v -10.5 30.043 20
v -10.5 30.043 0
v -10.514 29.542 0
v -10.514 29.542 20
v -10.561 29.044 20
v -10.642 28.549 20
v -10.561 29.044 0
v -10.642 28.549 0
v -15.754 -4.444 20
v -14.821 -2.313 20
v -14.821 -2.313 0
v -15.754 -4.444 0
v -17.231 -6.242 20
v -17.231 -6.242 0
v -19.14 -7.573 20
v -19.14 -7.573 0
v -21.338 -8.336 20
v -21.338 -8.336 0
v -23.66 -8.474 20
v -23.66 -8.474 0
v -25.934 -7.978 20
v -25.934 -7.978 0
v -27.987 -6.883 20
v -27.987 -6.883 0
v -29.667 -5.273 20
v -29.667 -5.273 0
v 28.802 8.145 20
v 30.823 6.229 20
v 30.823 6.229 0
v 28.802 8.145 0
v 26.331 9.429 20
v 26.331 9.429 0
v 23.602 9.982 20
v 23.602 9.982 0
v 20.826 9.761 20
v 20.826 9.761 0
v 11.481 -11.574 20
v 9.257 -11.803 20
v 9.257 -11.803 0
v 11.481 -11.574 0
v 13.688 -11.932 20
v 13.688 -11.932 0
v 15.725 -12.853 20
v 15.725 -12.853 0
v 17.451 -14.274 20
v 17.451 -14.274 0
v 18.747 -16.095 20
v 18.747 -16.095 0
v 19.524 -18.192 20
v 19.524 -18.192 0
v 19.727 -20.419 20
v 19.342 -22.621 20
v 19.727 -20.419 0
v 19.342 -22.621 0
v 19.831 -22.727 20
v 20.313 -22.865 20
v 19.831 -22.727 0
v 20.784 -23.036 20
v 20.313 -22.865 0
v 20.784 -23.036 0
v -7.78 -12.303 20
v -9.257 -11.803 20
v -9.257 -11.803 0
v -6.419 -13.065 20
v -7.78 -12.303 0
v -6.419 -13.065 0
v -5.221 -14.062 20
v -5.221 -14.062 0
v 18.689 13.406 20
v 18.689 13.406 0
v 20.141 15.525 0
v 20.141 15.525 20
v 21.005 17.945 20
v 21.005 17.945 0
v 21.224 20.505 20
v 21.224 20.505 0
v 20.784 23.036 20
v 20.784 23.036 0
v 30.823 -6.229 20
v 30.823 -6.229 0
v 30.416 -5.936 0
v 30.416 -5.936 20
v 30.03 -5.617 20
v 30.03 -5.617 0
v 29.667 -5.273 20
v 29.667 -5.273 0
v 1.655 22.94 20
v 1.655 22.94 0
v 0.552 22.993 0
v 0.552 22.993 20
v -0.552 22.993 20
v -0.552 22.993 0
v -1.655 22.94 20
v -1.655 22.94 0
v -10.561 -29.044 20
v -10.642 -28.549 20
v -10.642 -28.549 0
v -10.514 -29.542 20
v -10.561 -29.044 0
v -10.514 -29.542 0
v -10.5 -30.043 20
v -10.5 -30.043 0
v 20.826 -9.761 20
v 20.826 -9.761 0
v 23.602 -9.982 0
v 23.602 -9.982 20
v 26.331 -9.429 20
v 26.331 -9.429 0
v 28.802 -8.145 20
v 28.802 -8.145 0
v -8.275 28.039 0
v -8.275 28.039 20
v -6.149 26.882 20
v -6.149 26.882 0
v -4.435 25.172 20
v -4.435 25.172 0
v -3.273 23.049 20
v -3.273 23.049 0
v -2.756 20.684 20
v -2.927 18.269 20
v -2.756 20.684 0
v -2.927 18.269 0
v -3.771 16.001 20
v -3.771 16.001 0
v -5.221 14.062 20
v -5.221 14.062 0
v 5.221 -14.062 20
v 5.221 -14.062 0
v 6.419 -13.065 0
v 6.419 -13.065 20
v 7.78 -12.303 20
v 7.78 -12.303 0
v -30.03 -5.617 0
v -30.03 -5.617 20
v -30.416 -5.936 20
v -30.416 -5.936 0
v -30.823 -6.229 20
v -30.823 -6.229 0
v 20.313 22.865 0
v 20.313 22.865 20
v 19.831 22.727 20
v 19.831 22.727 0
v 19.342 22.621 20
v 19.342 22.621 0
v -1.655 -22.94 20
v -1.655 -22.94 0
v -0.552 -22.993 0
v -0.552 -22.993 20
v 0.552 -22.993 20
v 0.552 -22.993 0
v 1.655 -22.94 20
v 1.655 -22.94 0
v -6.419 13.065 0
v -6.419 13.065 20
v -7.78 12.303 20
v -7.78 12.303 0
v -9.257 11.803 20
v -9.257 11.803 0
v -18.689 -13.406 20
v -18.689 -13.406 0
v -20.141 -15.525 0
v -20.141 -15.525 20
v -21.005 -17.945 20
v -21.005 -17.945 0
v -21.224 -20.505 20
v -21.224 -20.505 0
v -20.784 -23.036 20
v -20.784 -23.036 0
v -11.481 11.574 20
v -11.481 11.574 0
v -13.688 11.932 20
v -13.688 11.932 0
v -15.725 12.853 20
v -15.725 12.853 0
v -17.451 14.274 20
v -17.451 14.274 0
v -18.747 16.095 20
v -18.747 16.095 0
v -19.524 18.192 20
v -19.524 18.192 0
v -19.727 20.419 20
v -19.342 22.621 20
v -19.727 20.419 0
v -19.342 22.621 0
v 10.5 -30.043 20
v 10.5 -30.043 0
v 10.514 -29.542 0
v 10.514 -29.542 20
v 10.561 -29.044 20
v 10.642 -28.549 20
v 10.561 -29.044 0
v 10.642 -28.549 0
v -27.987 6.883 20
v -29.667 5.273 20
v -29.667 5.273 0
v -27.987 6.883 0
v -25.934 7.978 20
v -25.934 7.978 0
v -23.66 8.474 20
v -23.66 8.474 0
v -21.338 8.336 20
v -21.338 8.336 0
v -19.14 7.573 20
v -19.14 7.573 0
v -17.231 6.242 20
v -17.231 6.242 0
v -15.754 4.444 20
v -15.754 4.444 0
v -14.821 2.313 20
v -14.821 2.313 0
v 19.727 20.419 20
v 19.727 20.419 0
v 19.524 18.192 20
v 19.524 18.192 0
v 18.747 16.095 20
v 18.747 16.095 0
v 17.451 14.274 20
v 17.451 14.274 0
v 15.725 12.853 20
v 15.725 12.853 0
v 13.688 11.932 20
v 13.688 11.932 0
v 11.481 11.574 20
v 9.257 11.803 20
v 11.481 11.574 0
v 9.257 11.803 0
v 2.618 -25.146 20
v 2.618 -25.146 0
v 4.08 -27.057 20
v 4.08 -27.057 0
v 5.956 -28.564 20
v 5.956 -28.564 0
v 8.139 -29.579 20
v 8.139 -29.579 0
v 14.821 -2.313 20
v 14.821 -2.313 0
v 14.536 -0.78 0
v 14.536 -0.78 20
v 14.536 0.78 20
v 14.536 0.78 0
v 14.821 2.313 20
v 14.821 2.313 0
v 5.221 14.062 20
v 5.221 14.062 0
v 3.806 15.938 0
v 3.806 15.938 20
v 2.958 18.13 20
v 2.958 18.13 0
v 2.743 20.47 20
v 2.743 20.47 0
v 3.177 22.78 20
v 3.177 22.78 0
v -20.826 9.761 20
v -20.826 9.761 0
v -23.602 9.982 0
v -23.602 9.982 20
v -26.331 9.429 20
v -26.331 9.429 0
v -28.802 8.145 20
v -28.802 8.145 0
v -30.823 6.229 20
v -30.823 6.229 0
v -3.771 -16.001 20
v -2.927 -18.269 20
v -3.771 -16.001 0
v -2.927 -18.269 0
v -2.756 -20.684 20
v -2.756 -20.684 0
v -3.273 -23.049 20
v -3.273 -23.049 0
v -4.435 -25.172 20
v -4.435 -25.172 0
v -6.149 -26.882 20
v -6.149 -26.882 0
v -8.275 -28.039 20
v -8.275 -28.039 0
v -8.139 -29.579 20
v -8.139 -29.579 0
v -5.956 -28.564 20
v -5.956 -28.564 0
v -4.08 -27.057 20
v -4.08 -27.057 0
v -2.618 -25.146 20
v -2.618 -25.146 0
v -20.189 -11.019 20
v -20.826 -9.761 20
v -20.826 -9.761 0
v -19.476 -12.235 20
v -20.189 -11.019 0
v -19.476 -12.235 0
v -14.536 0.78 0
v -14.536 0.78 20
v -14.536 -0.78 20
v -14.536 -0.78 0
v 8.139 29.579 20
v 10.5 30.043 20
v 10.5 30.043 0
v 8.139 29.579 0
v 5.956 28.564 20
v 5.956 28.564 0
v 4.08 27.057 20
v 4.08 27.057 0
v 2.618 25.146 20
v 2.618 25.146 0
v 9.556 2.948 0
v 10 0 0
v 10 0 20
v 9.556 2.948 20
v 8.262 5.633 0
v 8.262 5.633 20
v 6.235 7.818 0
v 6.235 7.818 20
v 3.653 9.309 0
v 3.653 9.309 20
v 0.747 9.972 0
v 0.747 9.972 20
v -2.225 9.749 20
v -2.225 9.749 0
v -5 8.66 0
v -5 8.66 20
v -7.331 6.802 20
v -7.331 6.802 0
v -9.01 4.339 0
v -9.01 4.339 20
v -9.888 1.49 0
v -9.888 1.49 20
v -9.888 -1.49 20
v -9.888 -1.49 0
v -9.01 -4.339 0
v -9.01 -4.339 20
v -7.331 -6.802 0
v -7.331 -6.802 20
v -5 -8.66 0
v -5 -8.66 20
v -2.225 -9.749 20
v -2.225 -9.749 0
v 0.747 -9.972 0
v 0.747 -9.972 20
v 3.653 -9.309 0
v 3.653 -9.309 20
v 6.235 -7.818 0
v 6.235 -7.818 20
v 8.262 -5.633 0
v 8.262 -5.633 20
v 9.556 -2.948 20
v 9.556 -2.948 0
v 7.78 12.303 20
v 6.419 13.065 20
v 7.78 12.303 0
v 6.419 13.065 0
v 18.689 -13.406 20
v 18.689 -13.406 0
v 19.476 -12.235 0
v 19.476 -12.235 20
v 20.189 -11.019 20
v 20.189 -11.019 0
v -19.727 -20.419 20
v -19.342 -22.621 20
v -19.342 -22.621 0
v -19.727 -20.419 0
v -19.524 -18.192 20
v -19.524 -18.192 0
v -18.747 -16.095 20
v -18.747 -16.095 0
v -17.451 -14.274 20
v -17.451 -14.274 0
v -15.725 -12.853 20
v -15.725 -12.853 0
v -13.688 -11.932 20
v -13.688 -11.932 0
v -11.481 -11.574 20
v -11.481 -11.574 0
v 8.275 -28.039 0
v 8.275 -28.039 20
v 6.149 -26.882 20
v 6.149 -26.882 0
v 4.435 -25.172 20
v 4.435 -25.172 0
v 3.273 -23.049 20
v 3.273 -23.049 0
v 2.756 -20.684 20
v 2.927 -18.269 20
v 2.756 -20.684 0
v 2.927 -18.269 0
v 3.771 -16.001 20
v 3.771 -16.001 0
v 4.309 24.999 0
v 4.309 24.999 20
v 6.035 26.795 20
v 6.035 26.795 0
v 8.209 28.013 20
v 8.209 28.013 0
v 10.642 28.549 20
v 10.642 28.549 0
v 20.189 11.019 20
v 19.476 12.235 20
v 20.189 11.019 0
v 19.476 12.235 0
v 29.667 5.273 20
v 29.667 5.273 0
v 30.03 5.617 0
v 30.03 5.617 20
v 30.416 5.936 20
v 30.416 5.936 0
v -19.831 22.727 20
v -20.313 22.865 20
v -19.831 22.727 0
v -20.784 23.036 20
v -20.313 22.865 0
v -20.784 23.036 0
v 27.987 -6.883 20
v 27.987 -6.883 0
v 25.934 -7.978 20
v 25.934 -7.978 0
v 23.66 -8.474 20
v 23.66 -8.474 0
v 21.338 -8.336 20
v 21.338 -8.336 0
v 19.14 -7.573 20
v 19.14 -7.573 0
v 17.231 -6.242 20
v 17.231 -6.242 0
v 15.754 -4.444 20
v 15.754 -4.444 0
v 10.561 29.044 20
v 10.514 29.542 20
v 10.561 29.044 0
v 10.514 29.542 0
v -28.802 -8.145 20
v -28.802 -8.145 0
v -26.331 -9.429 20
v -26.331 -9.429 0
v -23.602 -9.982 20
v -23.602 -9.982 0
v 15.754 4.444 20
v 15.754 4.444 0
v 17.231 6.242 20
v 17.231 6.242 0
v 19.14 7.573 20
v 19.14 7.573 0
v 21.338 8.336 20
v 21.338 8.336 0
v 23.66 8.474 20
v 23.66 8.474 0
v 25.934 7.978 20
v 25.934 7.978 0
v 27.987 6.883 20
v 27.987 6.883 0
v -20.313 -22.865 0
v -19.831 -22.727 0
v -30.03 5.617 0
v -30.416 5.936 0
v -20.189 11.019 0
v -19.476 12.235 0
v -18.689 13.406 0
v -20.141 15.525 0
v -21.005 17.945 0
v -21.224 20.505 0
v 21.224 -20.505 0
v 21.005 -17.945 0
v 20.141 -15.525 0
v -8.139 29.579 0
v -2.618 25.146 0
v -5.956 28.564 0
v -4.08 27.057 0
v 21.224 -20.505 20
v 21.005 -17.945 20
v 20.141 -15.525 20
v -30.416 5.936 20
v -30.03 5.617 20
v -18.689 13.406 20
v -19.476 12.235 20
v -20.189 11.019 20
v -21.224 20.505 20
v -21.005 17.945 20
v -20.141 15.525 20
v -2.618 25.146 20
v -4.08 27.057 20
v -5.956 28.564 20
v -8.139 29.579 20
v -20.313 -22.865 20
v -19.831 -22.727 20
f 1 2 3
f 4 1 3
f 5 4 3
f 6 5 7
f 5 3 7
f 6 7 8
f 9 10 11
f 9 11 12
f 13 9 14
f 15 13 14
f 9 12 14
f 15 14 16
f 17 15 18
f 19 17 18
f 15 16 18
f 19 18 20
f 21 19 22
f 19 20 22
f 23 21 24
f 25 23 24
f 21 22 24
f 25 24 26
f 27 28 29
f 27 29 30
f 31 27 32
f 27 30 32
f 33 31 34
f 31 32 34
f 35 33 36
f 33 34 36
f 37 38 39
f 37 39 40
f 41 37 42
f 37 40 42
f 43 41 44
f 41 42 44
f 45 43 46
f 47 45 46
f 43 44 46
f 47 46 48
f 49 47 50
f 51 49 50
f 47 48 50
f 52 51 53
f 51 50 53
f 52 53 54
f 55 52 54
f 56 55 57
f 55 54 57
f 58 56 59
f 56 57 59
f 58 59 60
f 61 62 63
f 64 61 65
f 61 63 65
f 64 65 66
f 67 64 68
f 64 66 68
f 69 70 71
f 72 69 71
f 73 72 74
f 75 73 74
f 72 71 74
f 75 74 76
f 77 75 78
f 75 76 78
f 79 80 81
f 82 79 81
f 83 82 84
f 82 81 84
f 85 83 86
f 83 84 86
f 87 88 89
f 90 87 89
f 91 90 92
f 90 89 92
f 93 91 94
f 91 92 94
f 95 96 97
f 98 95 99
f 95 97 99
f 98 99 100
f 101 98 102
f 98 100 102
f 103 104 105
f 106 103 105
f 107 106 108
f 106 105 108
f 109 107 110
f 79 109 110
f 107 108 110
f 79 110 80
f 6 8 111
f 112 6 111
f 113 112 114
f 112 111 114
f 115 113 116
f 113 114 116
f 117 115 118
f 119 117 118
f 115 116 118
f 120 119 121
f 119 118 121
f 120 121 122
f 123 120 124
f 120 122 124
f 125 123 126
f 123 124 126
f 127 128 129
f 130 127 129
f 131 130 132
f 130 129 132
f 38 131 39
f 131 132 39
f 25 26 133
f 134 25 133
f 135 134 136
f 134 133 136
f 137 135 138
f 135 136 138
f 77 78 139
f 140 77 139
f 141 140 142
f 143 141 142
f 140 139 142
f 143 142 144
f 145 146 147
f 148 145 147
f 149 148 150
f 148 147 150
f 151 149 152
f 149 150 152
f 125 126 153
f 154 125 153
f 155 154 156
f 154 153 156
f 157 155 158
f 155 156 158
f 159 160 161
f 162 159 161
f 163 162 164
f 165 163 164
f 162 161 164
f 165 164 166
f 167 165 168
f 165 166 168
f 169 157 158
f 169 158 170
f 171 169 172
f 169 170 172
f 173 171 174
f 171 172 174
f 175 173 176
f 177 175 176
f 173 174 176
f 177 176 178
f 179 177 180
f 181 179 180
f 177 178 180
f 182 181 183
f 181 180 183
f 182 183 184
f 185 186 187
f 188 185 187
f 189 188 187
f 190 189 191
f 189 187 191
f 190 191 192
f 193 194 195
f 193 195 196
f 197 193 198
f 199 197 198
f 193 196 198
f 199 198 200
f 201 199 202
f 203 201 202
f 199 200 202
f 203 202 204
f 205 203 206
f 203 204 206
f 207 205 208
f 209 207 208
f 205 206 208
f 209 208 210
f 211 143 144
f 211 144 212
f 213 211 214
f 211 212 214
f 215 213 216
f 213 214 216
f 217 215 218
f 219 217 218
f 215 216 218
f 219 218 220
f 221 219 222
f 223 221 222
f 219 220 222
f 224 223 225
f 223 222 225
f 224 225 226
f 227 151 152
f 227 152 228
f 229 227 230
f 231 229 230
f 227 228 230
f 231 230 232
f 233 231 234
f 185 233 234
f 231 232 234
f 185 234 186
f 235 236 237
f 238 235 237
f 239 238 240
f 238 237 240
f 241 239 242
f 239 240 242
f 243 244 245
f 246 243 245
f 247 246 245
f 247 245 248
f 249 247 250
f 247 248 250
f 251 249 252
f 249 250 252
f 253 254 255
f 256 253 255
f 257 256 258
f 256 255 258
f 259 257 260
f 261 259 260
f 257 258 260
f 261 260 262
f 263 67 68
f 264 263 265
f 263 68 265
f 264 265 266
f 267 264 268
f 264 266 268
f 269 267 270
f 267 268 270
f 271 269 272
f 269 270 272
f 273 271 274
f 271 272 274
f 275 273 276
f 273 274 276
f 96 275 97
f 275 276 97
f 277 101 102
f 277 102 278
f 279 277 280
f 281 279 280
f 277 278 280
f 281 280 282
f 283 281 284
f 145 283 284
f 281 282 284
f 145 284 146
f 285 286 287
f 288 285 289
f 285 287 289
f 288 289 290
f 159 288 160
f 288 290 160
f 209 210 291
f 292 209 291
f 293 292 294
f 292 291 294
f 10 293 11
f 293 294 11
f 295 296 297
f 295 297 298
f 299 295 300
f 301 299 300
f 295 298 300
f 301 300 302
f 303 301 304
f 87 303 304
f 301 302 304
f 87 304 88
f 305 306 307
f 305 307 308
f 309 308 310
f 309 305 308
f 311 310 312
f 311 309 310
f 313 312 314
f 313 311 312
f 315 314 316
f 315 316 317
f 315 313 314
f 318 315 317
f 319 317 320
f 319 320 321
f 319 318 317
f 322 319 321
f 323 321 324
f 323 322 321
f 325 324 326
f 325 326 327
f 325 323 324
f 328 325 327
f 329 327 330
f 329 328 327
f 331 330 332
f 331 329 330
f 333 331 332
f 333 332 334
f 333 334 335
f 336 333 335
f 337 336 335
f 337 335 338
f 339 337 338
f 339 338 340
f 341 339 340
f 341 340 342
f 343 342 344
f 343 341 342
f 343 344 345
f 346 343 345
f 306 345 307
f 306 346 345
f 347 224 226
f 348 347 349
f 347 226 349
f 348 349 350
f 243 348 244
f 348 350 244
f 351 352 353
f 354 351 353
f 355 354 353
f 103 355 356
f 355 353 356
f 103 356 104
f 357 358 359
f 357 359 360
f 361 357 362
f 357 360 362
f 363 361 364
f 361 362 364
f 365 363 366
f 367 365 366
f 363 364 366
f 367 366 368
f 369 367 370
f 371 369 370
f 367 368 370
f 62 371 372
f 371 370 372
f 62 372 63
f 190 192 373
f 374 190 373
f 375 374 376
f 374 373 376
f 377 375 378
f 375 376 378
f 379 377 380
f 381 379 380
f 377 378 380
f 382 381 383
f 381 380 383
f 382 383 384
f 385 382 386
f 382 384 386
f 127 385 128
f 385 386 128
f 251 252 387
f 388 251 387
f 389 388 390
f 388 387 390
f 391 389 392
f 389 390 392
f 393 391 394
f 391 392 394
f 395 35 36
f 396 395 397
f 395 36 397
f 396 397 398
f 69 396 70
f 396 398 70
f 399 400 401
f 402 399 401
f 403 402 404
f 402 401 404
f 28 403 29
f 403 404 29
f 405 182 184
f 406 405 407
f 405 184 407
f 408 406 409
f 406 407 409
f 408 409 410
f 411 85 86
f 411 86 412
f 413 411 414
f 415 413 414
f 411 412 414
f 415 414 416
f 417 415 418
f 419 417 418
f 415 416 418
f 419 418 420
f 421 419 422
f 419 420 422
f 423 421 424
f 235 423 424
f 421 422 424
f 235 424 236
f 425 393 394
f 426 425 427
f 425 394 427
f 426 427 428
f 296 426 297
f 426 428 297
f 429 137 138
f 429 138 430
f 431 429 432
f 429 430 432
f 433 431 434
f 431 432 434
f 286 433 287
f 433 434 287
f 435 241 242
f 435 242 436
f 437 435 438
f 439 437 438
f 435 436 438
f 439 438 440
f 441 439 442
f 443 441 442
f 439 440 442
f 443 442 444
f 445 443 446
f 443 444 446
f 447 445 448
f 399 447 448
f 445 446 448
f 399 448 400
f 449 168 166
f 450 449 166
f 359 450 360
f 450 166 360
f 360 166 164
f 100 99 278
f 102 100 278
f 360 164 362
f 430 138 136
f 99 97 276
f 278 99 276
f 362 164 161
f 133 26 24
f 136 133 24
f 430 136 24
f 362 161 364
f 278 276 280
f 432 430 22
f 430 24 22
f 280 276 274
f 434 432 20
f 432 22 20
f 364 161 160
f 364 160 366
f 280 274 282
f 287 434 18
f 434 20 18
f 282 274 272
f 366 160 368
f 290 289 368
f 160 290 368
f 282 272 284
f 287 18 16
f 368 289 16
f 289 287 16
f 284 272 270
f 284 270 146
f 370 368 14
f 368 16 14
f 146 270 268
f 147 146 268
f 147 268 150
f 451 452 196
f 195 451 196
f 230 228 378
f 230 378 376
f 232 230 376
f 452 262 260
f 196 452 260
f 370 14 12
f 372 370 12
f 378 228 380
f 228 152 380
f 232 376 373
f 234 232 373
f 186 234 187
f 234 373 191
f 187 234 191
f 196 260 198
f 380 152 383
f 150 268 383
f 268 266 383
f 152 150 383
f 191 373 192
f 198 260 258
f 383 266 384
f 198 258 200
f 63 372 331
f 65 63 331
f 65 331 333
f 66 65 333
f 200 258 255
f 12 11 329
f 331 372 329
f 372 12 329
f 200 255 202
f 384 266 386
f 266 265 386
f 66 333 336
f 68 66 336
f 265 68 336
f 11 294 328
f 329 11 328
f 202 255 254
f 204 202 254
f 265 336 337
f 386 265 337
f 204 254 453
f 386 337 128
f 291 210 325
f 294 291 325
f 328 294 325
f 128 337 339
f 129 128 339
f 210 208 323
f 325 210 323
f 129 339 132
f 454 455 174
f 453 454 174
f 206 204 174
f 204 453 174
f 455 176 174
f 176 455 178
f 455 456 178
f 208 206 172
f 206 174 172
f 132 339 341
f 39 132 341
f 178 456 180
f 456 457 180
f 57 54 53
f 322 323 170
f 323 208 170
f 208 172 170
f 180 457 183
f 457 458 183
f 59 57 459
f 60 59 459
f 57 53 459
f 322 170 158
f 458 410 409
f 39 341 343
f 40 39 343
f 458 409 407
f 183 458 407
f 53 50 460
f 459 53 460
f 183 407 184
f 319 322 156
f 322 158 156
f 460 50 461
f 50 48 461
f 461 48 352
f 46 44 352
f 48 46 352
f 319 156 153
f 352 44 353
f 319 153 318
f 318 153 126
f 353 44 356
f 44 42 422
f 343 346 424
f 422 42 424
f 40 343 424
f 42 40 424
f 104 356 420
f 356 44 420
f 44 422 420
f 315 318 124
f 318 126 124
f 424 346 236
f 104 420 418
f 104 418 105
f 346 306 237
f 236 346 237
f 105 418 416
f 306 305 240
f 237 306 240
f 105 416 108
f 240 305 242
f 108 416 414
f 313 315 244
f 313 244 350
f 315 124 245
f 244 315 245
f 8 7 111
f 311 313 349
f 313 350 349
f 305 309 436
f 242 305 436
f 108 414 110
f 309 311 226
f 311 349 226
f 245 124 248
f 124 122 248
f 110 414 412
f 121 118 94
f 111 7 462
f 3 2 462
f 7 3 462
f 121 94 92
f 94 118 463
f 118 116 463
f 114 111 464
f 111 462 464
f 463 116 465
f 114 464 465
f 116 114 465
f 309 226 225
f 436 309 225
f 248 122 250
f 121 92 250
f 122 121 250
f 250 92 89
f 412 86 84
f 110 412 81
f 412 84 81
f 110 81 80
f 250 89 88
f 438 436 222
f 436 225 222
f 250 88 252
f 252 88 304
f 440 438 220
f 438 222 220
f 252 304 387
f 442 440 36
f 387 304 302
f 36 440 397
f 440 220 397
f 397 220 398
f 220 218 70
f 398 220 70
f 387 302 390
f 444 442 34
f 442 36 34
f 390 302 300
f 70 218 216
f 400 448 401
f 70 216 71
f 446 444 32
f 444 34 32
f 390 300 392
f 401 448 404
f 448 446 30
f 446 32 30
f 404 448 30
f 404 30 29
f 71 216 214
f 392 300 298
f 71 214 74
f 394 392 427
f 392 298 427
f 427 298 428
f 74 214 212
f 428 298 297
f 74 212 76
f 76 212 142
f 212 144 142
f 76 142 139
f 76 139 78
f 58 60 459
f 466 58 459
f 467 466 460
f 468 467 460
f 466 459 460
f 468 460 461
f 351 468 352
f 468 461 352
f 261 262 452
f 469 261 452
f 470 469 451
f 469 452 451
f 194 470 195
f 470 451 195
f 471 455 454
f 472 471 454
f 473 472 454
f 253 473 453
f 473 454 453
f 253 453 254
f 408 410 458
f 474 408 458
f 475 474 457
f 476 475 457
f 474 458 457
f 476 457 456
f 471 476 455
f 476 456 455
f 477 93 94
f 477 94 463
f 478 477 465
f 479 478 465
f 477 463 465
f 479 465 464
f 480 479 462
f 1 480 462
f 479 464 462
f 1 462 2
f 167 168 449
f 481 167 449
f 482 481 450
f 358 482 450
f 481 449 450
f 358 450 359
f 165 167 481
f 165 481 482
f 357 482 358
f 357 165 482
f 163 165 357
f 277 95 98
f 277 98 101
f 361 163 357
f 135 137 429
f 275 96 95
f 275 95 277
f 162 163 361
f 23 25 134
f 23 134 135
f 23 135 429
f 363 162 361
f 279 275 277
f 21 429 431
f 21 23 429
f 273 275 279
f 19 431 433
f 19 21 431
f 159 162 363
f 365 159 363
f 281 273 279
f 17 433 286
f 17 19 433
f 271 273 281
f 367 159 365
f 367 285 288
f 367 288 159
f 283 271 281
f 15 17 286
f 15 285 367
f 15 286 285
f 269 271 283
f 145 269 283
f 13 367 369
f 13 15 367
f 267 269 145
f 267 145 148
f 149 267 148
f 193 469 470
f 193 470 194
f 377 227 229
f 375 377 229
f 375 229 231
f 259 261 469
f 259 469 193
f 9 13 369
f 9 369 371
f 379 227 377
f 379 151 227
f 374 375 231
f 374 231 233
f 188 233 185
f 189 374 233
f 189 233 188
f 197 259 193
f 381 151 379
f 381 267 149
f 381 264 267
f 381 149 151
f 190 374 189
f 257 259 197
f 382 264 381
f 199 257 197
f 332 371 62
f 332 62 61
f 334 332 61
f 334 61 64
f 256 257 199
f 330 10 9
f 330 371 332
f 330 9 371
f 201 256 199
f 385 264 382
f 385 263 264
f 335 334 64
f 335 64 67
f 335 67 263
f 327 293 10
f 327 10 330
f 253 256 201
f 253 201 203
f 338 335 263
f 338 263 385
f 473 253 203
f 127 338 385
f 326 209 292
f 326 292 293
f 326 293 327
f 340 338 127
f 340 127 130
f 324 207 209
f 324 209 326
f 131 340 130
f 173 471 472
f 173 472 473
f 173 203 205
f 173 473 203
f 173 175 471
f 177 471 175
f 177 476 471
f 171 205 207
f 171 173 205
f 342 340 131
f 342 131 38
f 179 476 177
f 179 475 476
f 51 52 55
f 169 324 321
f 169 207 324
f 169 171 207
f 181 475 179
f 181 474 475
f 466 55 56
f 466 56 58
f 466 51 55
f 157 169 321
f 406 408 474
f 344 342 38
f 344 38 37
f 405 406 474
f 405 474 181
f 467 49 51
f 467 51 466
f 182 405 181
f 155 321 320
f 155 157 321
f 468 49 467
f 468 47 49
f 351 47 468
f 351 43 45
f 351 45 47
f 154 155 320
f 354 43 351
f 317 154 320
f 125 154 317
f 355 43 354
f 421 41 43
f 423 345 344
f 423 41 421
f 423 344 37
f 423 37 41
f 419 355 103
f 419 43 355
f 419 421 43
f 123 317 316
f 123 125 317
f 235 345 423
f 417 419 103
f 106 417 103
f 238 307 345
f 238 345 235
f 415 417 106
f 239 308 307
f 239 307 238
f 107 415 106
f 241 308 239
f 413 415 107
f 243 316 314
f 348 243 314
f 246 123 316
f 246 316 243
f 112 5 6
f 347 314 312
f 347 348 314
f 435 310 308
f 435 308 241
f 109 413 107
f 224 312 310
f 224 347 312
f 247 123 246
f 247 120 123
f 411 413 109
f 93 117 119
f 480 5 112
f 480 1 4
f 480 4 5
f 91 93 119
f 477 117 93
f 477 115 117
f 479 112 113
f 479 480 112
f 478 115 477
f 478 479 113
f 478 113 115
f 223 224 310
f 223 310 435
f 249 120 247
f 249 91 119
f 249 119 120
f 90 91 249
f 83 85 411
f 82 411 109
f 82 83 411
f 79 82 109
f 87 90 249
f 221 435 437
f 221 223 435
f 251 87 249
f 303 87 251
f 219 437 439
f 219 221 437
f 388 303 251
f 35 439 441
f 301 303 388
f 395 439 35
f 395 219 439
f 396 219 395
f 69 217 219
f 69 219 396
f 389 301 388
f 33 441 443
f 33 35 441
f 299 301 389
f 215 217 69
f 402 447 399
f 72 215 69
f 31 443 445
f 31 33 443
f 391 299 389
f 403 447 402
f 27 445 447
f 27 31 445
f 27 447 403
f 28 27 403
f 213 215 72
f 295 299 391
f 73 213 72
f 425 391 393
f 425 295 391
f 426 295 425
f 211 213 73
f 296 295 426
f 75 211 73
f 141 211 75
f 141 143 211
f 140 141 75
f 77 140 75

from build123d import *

# Parameters (mm, degrees)
F0_R     = 10
F1_DEPTH = 20


with BuildPart() as f1:
    # F0 (on Top) → F1 (new body)
    with BuildSketch(Plane.XY):
        with BuildLine():
            ThreePointArc((29.666667, -5.273097), (21.337731, -8.335878), (14.820652, -2.312633))
            ThreePointArc((14.820652, -2.312633), (14.5, 0), (14.820652, 2.312633))
            ThreePointArc((14.820652, 2.312633), (21.337731, 8.335878), (29.666667, 5.273097))
            ThreePointArc((29.666667, 5.273097), (30.220826, 5.780095), (30.822917, 6.229123))
            ThreePointArc((30.822917, 6.229123), (26.331077, 9.428888), (20.826087, 9.760845))
            ThreePointArc((20.826087, 9.760845), (19.841569, 11.632375), (18.68932, 13.405571))
            ThreePointArc((18.68932, 13.405571), (21.005287, 17.944736), (20.783802, 23.035774))
            ThreePointArc((20.783802, 23.035774), (20.073237, 22.792248), (19.341877, 22.621019))
            ThreePointArc((19.341877, 22.621019), (17.451033, 14.273836), (9.256765, 11.803063))
            ThreePointArc((9.256765, 11.803063), (7.082131, 12.652803), (5.220726, 14.062149))
            ThreePointArc((5.220726, 14.062149), (2.958081, 18.129936), (3.177151, 22.779502))
            ThreePointArc((3.177151, 22.779502), (2.417192, 22.87263), (1.654554, 22.940411))
            ThreePointArc((1.654554, 22.940411), (0, 23), (-1.654554, 22.940411))
            ThreePointArc((-1.654554, 22.940411), (-4.972729, 27.867393), (-10.500123, 30.043018))
            ThreePointArc((-10.500123, 30.043018), (-10.533434, 29.292619), (-10.641636, 28.549316))
            ThreePointArc((-10.641636, 28.549316), (-3.272802, 23.048837), (-5.220726, 14.062149))
            ThreePointArc((-5.220726, 14.062149), (-7.082131, 12.652803), (-9.256765, 11.803063))
            ThreePointArc((-9.256765, 11.803063), (-17.451033, 14.273836), (-19.341877, 22.621019))
            ThreePointArc((-19.341877, 22.621019), (-20.073237, 22.792248), (-20.783802, 23.035774))
            ThreePointArc((-20.783802, 23.035774), (-21.005287, 17.944736), (-18.68932, 13.405571))
            ThreePointArc((-18.68932, 13.405571), (-19.841569, 11.632375), (-20.826087, 9.760845))
            ThreePointArc((-20.826087, 9.760845), (-26.331077, 9.428888), (-30.822917, 6.229123))
            ThreePointArc((-30.822917, 6.229123), (-30.220826, 5.780095), (-29.666667, 5.273097))
            ThreePointArc((-29.666667, 5.273097), (-21.337731, 8.335878), (-14.820652, 2.312633))
            ThreePointArc((-14.820652, 2.312633), (-14.5, 0), (-14.820652, -2.312633))
            ThreePointArc((-14.820652, -2.312633), (-21.337731, -8.335878), (-29.666667, -5.273097))
            ThreePointArc((-29.666667, -5.273097), (-30.220826, -5.780095), (-30.822917, -6.229123))
            ThreePointArc((-30.822917, -6.229123), (-26.331077, -9.428888), (-20.826087, -9.760845))
            ThreePointArc((-20.826087, -9.760845), (-19.841569, -11.632375), (-18.68932, -13.405571))
            ThreePointArc((-18.68932, -13.405571), (-21.005287, -17.944736), (-20.783802, -23.035774))
            ThreePointArc((-20.783802, -23.035774), (-20.073237, -22.792248), (-19.341877, -22.621019))
            ThreePointArc((-19.341877, -22.621019), (-17.451033, -14.273836), (-9.256765, -11.803063))
            ThreePointArc((-9.256765, -11.803063), (-7.082131, -12.652803), (-5.220726, -14.062149))
            ThreePointArc((-5.220726, -14.062149), (-3.272802, -23.048837), (-10.641636, -28.549316))
            ThreePointArc((-10.641636, -28.549316), (-10.533434, -29.292619), (-10.500123, -30.043018))
            ThreePointArc((-10.500123, -30.043018), (-4.972729, -27.867393), (-1.654554, -22.940411))
            ThreePointArc((-1.654554, -22.940411), (0, -23), (1.654554, -22.940411))
            ThreePointArc((1.654554, -22.940411), (4.972729, -27.867393), (10.500123, -30.043018))
            ThreePointArc((10.500123, -30.043018), (10.533434, -29.292619), (10.641636, -28.549316))
            ThreePointArc((10.641636, -28.549316), (3.272802, -23.048837), (5.220726, -14.062149))
            ThreePointArc((5.220726, -14.062149), (7.082131, -12.652803), (9.256765, -11.803063))
            ThreePointArc((9.256765, -11.803063), (17.451033, -14.273836), (19.341877, -22.621019))
            ThreePointArc((19.341877, -22.621019), (20.073237, -22.792248), (20.783802, -23.035774))
            ThreePointArc((20.783802, -23.035774), (21.005287, -17.944736), (18.68932, -13.405571))
            ThreePointArc((18.68932, -13.405571), (19.841569, -11.632375), (20.826087, -9.760845))
            ThreePointArc((20.826087, -9.760845), (26.331077, -9.428888), (30.822917, -6.229123))
            ThreePointArc((30.822917, -6.229123), (30.220826, -5.780095), (29.666667, -5.273097))
        make_face()
        Circle(F0_R, mode=Mode.SUBTRACT)
        with BuildLine():
            ThreePointArc((1.654554, 22.940411), (2.417192, 22.87263), (3.177151, 22.779502))
            ThreePointArc((3.177151, 22.779502), (6.035405, 26.795099), (10.641636, 28.549316))
            ThreePointArc((10.641636, 28.549316), (10.533434, 29.292619), (10.500123, 30.043018))
            ThreePointArc((10.500123, 30.043018), (4.972729, 27.867393), (1.654554, 22.940411))
        make_face()
    extrude(amount=F1_DEPTH)


solid = f1.part
